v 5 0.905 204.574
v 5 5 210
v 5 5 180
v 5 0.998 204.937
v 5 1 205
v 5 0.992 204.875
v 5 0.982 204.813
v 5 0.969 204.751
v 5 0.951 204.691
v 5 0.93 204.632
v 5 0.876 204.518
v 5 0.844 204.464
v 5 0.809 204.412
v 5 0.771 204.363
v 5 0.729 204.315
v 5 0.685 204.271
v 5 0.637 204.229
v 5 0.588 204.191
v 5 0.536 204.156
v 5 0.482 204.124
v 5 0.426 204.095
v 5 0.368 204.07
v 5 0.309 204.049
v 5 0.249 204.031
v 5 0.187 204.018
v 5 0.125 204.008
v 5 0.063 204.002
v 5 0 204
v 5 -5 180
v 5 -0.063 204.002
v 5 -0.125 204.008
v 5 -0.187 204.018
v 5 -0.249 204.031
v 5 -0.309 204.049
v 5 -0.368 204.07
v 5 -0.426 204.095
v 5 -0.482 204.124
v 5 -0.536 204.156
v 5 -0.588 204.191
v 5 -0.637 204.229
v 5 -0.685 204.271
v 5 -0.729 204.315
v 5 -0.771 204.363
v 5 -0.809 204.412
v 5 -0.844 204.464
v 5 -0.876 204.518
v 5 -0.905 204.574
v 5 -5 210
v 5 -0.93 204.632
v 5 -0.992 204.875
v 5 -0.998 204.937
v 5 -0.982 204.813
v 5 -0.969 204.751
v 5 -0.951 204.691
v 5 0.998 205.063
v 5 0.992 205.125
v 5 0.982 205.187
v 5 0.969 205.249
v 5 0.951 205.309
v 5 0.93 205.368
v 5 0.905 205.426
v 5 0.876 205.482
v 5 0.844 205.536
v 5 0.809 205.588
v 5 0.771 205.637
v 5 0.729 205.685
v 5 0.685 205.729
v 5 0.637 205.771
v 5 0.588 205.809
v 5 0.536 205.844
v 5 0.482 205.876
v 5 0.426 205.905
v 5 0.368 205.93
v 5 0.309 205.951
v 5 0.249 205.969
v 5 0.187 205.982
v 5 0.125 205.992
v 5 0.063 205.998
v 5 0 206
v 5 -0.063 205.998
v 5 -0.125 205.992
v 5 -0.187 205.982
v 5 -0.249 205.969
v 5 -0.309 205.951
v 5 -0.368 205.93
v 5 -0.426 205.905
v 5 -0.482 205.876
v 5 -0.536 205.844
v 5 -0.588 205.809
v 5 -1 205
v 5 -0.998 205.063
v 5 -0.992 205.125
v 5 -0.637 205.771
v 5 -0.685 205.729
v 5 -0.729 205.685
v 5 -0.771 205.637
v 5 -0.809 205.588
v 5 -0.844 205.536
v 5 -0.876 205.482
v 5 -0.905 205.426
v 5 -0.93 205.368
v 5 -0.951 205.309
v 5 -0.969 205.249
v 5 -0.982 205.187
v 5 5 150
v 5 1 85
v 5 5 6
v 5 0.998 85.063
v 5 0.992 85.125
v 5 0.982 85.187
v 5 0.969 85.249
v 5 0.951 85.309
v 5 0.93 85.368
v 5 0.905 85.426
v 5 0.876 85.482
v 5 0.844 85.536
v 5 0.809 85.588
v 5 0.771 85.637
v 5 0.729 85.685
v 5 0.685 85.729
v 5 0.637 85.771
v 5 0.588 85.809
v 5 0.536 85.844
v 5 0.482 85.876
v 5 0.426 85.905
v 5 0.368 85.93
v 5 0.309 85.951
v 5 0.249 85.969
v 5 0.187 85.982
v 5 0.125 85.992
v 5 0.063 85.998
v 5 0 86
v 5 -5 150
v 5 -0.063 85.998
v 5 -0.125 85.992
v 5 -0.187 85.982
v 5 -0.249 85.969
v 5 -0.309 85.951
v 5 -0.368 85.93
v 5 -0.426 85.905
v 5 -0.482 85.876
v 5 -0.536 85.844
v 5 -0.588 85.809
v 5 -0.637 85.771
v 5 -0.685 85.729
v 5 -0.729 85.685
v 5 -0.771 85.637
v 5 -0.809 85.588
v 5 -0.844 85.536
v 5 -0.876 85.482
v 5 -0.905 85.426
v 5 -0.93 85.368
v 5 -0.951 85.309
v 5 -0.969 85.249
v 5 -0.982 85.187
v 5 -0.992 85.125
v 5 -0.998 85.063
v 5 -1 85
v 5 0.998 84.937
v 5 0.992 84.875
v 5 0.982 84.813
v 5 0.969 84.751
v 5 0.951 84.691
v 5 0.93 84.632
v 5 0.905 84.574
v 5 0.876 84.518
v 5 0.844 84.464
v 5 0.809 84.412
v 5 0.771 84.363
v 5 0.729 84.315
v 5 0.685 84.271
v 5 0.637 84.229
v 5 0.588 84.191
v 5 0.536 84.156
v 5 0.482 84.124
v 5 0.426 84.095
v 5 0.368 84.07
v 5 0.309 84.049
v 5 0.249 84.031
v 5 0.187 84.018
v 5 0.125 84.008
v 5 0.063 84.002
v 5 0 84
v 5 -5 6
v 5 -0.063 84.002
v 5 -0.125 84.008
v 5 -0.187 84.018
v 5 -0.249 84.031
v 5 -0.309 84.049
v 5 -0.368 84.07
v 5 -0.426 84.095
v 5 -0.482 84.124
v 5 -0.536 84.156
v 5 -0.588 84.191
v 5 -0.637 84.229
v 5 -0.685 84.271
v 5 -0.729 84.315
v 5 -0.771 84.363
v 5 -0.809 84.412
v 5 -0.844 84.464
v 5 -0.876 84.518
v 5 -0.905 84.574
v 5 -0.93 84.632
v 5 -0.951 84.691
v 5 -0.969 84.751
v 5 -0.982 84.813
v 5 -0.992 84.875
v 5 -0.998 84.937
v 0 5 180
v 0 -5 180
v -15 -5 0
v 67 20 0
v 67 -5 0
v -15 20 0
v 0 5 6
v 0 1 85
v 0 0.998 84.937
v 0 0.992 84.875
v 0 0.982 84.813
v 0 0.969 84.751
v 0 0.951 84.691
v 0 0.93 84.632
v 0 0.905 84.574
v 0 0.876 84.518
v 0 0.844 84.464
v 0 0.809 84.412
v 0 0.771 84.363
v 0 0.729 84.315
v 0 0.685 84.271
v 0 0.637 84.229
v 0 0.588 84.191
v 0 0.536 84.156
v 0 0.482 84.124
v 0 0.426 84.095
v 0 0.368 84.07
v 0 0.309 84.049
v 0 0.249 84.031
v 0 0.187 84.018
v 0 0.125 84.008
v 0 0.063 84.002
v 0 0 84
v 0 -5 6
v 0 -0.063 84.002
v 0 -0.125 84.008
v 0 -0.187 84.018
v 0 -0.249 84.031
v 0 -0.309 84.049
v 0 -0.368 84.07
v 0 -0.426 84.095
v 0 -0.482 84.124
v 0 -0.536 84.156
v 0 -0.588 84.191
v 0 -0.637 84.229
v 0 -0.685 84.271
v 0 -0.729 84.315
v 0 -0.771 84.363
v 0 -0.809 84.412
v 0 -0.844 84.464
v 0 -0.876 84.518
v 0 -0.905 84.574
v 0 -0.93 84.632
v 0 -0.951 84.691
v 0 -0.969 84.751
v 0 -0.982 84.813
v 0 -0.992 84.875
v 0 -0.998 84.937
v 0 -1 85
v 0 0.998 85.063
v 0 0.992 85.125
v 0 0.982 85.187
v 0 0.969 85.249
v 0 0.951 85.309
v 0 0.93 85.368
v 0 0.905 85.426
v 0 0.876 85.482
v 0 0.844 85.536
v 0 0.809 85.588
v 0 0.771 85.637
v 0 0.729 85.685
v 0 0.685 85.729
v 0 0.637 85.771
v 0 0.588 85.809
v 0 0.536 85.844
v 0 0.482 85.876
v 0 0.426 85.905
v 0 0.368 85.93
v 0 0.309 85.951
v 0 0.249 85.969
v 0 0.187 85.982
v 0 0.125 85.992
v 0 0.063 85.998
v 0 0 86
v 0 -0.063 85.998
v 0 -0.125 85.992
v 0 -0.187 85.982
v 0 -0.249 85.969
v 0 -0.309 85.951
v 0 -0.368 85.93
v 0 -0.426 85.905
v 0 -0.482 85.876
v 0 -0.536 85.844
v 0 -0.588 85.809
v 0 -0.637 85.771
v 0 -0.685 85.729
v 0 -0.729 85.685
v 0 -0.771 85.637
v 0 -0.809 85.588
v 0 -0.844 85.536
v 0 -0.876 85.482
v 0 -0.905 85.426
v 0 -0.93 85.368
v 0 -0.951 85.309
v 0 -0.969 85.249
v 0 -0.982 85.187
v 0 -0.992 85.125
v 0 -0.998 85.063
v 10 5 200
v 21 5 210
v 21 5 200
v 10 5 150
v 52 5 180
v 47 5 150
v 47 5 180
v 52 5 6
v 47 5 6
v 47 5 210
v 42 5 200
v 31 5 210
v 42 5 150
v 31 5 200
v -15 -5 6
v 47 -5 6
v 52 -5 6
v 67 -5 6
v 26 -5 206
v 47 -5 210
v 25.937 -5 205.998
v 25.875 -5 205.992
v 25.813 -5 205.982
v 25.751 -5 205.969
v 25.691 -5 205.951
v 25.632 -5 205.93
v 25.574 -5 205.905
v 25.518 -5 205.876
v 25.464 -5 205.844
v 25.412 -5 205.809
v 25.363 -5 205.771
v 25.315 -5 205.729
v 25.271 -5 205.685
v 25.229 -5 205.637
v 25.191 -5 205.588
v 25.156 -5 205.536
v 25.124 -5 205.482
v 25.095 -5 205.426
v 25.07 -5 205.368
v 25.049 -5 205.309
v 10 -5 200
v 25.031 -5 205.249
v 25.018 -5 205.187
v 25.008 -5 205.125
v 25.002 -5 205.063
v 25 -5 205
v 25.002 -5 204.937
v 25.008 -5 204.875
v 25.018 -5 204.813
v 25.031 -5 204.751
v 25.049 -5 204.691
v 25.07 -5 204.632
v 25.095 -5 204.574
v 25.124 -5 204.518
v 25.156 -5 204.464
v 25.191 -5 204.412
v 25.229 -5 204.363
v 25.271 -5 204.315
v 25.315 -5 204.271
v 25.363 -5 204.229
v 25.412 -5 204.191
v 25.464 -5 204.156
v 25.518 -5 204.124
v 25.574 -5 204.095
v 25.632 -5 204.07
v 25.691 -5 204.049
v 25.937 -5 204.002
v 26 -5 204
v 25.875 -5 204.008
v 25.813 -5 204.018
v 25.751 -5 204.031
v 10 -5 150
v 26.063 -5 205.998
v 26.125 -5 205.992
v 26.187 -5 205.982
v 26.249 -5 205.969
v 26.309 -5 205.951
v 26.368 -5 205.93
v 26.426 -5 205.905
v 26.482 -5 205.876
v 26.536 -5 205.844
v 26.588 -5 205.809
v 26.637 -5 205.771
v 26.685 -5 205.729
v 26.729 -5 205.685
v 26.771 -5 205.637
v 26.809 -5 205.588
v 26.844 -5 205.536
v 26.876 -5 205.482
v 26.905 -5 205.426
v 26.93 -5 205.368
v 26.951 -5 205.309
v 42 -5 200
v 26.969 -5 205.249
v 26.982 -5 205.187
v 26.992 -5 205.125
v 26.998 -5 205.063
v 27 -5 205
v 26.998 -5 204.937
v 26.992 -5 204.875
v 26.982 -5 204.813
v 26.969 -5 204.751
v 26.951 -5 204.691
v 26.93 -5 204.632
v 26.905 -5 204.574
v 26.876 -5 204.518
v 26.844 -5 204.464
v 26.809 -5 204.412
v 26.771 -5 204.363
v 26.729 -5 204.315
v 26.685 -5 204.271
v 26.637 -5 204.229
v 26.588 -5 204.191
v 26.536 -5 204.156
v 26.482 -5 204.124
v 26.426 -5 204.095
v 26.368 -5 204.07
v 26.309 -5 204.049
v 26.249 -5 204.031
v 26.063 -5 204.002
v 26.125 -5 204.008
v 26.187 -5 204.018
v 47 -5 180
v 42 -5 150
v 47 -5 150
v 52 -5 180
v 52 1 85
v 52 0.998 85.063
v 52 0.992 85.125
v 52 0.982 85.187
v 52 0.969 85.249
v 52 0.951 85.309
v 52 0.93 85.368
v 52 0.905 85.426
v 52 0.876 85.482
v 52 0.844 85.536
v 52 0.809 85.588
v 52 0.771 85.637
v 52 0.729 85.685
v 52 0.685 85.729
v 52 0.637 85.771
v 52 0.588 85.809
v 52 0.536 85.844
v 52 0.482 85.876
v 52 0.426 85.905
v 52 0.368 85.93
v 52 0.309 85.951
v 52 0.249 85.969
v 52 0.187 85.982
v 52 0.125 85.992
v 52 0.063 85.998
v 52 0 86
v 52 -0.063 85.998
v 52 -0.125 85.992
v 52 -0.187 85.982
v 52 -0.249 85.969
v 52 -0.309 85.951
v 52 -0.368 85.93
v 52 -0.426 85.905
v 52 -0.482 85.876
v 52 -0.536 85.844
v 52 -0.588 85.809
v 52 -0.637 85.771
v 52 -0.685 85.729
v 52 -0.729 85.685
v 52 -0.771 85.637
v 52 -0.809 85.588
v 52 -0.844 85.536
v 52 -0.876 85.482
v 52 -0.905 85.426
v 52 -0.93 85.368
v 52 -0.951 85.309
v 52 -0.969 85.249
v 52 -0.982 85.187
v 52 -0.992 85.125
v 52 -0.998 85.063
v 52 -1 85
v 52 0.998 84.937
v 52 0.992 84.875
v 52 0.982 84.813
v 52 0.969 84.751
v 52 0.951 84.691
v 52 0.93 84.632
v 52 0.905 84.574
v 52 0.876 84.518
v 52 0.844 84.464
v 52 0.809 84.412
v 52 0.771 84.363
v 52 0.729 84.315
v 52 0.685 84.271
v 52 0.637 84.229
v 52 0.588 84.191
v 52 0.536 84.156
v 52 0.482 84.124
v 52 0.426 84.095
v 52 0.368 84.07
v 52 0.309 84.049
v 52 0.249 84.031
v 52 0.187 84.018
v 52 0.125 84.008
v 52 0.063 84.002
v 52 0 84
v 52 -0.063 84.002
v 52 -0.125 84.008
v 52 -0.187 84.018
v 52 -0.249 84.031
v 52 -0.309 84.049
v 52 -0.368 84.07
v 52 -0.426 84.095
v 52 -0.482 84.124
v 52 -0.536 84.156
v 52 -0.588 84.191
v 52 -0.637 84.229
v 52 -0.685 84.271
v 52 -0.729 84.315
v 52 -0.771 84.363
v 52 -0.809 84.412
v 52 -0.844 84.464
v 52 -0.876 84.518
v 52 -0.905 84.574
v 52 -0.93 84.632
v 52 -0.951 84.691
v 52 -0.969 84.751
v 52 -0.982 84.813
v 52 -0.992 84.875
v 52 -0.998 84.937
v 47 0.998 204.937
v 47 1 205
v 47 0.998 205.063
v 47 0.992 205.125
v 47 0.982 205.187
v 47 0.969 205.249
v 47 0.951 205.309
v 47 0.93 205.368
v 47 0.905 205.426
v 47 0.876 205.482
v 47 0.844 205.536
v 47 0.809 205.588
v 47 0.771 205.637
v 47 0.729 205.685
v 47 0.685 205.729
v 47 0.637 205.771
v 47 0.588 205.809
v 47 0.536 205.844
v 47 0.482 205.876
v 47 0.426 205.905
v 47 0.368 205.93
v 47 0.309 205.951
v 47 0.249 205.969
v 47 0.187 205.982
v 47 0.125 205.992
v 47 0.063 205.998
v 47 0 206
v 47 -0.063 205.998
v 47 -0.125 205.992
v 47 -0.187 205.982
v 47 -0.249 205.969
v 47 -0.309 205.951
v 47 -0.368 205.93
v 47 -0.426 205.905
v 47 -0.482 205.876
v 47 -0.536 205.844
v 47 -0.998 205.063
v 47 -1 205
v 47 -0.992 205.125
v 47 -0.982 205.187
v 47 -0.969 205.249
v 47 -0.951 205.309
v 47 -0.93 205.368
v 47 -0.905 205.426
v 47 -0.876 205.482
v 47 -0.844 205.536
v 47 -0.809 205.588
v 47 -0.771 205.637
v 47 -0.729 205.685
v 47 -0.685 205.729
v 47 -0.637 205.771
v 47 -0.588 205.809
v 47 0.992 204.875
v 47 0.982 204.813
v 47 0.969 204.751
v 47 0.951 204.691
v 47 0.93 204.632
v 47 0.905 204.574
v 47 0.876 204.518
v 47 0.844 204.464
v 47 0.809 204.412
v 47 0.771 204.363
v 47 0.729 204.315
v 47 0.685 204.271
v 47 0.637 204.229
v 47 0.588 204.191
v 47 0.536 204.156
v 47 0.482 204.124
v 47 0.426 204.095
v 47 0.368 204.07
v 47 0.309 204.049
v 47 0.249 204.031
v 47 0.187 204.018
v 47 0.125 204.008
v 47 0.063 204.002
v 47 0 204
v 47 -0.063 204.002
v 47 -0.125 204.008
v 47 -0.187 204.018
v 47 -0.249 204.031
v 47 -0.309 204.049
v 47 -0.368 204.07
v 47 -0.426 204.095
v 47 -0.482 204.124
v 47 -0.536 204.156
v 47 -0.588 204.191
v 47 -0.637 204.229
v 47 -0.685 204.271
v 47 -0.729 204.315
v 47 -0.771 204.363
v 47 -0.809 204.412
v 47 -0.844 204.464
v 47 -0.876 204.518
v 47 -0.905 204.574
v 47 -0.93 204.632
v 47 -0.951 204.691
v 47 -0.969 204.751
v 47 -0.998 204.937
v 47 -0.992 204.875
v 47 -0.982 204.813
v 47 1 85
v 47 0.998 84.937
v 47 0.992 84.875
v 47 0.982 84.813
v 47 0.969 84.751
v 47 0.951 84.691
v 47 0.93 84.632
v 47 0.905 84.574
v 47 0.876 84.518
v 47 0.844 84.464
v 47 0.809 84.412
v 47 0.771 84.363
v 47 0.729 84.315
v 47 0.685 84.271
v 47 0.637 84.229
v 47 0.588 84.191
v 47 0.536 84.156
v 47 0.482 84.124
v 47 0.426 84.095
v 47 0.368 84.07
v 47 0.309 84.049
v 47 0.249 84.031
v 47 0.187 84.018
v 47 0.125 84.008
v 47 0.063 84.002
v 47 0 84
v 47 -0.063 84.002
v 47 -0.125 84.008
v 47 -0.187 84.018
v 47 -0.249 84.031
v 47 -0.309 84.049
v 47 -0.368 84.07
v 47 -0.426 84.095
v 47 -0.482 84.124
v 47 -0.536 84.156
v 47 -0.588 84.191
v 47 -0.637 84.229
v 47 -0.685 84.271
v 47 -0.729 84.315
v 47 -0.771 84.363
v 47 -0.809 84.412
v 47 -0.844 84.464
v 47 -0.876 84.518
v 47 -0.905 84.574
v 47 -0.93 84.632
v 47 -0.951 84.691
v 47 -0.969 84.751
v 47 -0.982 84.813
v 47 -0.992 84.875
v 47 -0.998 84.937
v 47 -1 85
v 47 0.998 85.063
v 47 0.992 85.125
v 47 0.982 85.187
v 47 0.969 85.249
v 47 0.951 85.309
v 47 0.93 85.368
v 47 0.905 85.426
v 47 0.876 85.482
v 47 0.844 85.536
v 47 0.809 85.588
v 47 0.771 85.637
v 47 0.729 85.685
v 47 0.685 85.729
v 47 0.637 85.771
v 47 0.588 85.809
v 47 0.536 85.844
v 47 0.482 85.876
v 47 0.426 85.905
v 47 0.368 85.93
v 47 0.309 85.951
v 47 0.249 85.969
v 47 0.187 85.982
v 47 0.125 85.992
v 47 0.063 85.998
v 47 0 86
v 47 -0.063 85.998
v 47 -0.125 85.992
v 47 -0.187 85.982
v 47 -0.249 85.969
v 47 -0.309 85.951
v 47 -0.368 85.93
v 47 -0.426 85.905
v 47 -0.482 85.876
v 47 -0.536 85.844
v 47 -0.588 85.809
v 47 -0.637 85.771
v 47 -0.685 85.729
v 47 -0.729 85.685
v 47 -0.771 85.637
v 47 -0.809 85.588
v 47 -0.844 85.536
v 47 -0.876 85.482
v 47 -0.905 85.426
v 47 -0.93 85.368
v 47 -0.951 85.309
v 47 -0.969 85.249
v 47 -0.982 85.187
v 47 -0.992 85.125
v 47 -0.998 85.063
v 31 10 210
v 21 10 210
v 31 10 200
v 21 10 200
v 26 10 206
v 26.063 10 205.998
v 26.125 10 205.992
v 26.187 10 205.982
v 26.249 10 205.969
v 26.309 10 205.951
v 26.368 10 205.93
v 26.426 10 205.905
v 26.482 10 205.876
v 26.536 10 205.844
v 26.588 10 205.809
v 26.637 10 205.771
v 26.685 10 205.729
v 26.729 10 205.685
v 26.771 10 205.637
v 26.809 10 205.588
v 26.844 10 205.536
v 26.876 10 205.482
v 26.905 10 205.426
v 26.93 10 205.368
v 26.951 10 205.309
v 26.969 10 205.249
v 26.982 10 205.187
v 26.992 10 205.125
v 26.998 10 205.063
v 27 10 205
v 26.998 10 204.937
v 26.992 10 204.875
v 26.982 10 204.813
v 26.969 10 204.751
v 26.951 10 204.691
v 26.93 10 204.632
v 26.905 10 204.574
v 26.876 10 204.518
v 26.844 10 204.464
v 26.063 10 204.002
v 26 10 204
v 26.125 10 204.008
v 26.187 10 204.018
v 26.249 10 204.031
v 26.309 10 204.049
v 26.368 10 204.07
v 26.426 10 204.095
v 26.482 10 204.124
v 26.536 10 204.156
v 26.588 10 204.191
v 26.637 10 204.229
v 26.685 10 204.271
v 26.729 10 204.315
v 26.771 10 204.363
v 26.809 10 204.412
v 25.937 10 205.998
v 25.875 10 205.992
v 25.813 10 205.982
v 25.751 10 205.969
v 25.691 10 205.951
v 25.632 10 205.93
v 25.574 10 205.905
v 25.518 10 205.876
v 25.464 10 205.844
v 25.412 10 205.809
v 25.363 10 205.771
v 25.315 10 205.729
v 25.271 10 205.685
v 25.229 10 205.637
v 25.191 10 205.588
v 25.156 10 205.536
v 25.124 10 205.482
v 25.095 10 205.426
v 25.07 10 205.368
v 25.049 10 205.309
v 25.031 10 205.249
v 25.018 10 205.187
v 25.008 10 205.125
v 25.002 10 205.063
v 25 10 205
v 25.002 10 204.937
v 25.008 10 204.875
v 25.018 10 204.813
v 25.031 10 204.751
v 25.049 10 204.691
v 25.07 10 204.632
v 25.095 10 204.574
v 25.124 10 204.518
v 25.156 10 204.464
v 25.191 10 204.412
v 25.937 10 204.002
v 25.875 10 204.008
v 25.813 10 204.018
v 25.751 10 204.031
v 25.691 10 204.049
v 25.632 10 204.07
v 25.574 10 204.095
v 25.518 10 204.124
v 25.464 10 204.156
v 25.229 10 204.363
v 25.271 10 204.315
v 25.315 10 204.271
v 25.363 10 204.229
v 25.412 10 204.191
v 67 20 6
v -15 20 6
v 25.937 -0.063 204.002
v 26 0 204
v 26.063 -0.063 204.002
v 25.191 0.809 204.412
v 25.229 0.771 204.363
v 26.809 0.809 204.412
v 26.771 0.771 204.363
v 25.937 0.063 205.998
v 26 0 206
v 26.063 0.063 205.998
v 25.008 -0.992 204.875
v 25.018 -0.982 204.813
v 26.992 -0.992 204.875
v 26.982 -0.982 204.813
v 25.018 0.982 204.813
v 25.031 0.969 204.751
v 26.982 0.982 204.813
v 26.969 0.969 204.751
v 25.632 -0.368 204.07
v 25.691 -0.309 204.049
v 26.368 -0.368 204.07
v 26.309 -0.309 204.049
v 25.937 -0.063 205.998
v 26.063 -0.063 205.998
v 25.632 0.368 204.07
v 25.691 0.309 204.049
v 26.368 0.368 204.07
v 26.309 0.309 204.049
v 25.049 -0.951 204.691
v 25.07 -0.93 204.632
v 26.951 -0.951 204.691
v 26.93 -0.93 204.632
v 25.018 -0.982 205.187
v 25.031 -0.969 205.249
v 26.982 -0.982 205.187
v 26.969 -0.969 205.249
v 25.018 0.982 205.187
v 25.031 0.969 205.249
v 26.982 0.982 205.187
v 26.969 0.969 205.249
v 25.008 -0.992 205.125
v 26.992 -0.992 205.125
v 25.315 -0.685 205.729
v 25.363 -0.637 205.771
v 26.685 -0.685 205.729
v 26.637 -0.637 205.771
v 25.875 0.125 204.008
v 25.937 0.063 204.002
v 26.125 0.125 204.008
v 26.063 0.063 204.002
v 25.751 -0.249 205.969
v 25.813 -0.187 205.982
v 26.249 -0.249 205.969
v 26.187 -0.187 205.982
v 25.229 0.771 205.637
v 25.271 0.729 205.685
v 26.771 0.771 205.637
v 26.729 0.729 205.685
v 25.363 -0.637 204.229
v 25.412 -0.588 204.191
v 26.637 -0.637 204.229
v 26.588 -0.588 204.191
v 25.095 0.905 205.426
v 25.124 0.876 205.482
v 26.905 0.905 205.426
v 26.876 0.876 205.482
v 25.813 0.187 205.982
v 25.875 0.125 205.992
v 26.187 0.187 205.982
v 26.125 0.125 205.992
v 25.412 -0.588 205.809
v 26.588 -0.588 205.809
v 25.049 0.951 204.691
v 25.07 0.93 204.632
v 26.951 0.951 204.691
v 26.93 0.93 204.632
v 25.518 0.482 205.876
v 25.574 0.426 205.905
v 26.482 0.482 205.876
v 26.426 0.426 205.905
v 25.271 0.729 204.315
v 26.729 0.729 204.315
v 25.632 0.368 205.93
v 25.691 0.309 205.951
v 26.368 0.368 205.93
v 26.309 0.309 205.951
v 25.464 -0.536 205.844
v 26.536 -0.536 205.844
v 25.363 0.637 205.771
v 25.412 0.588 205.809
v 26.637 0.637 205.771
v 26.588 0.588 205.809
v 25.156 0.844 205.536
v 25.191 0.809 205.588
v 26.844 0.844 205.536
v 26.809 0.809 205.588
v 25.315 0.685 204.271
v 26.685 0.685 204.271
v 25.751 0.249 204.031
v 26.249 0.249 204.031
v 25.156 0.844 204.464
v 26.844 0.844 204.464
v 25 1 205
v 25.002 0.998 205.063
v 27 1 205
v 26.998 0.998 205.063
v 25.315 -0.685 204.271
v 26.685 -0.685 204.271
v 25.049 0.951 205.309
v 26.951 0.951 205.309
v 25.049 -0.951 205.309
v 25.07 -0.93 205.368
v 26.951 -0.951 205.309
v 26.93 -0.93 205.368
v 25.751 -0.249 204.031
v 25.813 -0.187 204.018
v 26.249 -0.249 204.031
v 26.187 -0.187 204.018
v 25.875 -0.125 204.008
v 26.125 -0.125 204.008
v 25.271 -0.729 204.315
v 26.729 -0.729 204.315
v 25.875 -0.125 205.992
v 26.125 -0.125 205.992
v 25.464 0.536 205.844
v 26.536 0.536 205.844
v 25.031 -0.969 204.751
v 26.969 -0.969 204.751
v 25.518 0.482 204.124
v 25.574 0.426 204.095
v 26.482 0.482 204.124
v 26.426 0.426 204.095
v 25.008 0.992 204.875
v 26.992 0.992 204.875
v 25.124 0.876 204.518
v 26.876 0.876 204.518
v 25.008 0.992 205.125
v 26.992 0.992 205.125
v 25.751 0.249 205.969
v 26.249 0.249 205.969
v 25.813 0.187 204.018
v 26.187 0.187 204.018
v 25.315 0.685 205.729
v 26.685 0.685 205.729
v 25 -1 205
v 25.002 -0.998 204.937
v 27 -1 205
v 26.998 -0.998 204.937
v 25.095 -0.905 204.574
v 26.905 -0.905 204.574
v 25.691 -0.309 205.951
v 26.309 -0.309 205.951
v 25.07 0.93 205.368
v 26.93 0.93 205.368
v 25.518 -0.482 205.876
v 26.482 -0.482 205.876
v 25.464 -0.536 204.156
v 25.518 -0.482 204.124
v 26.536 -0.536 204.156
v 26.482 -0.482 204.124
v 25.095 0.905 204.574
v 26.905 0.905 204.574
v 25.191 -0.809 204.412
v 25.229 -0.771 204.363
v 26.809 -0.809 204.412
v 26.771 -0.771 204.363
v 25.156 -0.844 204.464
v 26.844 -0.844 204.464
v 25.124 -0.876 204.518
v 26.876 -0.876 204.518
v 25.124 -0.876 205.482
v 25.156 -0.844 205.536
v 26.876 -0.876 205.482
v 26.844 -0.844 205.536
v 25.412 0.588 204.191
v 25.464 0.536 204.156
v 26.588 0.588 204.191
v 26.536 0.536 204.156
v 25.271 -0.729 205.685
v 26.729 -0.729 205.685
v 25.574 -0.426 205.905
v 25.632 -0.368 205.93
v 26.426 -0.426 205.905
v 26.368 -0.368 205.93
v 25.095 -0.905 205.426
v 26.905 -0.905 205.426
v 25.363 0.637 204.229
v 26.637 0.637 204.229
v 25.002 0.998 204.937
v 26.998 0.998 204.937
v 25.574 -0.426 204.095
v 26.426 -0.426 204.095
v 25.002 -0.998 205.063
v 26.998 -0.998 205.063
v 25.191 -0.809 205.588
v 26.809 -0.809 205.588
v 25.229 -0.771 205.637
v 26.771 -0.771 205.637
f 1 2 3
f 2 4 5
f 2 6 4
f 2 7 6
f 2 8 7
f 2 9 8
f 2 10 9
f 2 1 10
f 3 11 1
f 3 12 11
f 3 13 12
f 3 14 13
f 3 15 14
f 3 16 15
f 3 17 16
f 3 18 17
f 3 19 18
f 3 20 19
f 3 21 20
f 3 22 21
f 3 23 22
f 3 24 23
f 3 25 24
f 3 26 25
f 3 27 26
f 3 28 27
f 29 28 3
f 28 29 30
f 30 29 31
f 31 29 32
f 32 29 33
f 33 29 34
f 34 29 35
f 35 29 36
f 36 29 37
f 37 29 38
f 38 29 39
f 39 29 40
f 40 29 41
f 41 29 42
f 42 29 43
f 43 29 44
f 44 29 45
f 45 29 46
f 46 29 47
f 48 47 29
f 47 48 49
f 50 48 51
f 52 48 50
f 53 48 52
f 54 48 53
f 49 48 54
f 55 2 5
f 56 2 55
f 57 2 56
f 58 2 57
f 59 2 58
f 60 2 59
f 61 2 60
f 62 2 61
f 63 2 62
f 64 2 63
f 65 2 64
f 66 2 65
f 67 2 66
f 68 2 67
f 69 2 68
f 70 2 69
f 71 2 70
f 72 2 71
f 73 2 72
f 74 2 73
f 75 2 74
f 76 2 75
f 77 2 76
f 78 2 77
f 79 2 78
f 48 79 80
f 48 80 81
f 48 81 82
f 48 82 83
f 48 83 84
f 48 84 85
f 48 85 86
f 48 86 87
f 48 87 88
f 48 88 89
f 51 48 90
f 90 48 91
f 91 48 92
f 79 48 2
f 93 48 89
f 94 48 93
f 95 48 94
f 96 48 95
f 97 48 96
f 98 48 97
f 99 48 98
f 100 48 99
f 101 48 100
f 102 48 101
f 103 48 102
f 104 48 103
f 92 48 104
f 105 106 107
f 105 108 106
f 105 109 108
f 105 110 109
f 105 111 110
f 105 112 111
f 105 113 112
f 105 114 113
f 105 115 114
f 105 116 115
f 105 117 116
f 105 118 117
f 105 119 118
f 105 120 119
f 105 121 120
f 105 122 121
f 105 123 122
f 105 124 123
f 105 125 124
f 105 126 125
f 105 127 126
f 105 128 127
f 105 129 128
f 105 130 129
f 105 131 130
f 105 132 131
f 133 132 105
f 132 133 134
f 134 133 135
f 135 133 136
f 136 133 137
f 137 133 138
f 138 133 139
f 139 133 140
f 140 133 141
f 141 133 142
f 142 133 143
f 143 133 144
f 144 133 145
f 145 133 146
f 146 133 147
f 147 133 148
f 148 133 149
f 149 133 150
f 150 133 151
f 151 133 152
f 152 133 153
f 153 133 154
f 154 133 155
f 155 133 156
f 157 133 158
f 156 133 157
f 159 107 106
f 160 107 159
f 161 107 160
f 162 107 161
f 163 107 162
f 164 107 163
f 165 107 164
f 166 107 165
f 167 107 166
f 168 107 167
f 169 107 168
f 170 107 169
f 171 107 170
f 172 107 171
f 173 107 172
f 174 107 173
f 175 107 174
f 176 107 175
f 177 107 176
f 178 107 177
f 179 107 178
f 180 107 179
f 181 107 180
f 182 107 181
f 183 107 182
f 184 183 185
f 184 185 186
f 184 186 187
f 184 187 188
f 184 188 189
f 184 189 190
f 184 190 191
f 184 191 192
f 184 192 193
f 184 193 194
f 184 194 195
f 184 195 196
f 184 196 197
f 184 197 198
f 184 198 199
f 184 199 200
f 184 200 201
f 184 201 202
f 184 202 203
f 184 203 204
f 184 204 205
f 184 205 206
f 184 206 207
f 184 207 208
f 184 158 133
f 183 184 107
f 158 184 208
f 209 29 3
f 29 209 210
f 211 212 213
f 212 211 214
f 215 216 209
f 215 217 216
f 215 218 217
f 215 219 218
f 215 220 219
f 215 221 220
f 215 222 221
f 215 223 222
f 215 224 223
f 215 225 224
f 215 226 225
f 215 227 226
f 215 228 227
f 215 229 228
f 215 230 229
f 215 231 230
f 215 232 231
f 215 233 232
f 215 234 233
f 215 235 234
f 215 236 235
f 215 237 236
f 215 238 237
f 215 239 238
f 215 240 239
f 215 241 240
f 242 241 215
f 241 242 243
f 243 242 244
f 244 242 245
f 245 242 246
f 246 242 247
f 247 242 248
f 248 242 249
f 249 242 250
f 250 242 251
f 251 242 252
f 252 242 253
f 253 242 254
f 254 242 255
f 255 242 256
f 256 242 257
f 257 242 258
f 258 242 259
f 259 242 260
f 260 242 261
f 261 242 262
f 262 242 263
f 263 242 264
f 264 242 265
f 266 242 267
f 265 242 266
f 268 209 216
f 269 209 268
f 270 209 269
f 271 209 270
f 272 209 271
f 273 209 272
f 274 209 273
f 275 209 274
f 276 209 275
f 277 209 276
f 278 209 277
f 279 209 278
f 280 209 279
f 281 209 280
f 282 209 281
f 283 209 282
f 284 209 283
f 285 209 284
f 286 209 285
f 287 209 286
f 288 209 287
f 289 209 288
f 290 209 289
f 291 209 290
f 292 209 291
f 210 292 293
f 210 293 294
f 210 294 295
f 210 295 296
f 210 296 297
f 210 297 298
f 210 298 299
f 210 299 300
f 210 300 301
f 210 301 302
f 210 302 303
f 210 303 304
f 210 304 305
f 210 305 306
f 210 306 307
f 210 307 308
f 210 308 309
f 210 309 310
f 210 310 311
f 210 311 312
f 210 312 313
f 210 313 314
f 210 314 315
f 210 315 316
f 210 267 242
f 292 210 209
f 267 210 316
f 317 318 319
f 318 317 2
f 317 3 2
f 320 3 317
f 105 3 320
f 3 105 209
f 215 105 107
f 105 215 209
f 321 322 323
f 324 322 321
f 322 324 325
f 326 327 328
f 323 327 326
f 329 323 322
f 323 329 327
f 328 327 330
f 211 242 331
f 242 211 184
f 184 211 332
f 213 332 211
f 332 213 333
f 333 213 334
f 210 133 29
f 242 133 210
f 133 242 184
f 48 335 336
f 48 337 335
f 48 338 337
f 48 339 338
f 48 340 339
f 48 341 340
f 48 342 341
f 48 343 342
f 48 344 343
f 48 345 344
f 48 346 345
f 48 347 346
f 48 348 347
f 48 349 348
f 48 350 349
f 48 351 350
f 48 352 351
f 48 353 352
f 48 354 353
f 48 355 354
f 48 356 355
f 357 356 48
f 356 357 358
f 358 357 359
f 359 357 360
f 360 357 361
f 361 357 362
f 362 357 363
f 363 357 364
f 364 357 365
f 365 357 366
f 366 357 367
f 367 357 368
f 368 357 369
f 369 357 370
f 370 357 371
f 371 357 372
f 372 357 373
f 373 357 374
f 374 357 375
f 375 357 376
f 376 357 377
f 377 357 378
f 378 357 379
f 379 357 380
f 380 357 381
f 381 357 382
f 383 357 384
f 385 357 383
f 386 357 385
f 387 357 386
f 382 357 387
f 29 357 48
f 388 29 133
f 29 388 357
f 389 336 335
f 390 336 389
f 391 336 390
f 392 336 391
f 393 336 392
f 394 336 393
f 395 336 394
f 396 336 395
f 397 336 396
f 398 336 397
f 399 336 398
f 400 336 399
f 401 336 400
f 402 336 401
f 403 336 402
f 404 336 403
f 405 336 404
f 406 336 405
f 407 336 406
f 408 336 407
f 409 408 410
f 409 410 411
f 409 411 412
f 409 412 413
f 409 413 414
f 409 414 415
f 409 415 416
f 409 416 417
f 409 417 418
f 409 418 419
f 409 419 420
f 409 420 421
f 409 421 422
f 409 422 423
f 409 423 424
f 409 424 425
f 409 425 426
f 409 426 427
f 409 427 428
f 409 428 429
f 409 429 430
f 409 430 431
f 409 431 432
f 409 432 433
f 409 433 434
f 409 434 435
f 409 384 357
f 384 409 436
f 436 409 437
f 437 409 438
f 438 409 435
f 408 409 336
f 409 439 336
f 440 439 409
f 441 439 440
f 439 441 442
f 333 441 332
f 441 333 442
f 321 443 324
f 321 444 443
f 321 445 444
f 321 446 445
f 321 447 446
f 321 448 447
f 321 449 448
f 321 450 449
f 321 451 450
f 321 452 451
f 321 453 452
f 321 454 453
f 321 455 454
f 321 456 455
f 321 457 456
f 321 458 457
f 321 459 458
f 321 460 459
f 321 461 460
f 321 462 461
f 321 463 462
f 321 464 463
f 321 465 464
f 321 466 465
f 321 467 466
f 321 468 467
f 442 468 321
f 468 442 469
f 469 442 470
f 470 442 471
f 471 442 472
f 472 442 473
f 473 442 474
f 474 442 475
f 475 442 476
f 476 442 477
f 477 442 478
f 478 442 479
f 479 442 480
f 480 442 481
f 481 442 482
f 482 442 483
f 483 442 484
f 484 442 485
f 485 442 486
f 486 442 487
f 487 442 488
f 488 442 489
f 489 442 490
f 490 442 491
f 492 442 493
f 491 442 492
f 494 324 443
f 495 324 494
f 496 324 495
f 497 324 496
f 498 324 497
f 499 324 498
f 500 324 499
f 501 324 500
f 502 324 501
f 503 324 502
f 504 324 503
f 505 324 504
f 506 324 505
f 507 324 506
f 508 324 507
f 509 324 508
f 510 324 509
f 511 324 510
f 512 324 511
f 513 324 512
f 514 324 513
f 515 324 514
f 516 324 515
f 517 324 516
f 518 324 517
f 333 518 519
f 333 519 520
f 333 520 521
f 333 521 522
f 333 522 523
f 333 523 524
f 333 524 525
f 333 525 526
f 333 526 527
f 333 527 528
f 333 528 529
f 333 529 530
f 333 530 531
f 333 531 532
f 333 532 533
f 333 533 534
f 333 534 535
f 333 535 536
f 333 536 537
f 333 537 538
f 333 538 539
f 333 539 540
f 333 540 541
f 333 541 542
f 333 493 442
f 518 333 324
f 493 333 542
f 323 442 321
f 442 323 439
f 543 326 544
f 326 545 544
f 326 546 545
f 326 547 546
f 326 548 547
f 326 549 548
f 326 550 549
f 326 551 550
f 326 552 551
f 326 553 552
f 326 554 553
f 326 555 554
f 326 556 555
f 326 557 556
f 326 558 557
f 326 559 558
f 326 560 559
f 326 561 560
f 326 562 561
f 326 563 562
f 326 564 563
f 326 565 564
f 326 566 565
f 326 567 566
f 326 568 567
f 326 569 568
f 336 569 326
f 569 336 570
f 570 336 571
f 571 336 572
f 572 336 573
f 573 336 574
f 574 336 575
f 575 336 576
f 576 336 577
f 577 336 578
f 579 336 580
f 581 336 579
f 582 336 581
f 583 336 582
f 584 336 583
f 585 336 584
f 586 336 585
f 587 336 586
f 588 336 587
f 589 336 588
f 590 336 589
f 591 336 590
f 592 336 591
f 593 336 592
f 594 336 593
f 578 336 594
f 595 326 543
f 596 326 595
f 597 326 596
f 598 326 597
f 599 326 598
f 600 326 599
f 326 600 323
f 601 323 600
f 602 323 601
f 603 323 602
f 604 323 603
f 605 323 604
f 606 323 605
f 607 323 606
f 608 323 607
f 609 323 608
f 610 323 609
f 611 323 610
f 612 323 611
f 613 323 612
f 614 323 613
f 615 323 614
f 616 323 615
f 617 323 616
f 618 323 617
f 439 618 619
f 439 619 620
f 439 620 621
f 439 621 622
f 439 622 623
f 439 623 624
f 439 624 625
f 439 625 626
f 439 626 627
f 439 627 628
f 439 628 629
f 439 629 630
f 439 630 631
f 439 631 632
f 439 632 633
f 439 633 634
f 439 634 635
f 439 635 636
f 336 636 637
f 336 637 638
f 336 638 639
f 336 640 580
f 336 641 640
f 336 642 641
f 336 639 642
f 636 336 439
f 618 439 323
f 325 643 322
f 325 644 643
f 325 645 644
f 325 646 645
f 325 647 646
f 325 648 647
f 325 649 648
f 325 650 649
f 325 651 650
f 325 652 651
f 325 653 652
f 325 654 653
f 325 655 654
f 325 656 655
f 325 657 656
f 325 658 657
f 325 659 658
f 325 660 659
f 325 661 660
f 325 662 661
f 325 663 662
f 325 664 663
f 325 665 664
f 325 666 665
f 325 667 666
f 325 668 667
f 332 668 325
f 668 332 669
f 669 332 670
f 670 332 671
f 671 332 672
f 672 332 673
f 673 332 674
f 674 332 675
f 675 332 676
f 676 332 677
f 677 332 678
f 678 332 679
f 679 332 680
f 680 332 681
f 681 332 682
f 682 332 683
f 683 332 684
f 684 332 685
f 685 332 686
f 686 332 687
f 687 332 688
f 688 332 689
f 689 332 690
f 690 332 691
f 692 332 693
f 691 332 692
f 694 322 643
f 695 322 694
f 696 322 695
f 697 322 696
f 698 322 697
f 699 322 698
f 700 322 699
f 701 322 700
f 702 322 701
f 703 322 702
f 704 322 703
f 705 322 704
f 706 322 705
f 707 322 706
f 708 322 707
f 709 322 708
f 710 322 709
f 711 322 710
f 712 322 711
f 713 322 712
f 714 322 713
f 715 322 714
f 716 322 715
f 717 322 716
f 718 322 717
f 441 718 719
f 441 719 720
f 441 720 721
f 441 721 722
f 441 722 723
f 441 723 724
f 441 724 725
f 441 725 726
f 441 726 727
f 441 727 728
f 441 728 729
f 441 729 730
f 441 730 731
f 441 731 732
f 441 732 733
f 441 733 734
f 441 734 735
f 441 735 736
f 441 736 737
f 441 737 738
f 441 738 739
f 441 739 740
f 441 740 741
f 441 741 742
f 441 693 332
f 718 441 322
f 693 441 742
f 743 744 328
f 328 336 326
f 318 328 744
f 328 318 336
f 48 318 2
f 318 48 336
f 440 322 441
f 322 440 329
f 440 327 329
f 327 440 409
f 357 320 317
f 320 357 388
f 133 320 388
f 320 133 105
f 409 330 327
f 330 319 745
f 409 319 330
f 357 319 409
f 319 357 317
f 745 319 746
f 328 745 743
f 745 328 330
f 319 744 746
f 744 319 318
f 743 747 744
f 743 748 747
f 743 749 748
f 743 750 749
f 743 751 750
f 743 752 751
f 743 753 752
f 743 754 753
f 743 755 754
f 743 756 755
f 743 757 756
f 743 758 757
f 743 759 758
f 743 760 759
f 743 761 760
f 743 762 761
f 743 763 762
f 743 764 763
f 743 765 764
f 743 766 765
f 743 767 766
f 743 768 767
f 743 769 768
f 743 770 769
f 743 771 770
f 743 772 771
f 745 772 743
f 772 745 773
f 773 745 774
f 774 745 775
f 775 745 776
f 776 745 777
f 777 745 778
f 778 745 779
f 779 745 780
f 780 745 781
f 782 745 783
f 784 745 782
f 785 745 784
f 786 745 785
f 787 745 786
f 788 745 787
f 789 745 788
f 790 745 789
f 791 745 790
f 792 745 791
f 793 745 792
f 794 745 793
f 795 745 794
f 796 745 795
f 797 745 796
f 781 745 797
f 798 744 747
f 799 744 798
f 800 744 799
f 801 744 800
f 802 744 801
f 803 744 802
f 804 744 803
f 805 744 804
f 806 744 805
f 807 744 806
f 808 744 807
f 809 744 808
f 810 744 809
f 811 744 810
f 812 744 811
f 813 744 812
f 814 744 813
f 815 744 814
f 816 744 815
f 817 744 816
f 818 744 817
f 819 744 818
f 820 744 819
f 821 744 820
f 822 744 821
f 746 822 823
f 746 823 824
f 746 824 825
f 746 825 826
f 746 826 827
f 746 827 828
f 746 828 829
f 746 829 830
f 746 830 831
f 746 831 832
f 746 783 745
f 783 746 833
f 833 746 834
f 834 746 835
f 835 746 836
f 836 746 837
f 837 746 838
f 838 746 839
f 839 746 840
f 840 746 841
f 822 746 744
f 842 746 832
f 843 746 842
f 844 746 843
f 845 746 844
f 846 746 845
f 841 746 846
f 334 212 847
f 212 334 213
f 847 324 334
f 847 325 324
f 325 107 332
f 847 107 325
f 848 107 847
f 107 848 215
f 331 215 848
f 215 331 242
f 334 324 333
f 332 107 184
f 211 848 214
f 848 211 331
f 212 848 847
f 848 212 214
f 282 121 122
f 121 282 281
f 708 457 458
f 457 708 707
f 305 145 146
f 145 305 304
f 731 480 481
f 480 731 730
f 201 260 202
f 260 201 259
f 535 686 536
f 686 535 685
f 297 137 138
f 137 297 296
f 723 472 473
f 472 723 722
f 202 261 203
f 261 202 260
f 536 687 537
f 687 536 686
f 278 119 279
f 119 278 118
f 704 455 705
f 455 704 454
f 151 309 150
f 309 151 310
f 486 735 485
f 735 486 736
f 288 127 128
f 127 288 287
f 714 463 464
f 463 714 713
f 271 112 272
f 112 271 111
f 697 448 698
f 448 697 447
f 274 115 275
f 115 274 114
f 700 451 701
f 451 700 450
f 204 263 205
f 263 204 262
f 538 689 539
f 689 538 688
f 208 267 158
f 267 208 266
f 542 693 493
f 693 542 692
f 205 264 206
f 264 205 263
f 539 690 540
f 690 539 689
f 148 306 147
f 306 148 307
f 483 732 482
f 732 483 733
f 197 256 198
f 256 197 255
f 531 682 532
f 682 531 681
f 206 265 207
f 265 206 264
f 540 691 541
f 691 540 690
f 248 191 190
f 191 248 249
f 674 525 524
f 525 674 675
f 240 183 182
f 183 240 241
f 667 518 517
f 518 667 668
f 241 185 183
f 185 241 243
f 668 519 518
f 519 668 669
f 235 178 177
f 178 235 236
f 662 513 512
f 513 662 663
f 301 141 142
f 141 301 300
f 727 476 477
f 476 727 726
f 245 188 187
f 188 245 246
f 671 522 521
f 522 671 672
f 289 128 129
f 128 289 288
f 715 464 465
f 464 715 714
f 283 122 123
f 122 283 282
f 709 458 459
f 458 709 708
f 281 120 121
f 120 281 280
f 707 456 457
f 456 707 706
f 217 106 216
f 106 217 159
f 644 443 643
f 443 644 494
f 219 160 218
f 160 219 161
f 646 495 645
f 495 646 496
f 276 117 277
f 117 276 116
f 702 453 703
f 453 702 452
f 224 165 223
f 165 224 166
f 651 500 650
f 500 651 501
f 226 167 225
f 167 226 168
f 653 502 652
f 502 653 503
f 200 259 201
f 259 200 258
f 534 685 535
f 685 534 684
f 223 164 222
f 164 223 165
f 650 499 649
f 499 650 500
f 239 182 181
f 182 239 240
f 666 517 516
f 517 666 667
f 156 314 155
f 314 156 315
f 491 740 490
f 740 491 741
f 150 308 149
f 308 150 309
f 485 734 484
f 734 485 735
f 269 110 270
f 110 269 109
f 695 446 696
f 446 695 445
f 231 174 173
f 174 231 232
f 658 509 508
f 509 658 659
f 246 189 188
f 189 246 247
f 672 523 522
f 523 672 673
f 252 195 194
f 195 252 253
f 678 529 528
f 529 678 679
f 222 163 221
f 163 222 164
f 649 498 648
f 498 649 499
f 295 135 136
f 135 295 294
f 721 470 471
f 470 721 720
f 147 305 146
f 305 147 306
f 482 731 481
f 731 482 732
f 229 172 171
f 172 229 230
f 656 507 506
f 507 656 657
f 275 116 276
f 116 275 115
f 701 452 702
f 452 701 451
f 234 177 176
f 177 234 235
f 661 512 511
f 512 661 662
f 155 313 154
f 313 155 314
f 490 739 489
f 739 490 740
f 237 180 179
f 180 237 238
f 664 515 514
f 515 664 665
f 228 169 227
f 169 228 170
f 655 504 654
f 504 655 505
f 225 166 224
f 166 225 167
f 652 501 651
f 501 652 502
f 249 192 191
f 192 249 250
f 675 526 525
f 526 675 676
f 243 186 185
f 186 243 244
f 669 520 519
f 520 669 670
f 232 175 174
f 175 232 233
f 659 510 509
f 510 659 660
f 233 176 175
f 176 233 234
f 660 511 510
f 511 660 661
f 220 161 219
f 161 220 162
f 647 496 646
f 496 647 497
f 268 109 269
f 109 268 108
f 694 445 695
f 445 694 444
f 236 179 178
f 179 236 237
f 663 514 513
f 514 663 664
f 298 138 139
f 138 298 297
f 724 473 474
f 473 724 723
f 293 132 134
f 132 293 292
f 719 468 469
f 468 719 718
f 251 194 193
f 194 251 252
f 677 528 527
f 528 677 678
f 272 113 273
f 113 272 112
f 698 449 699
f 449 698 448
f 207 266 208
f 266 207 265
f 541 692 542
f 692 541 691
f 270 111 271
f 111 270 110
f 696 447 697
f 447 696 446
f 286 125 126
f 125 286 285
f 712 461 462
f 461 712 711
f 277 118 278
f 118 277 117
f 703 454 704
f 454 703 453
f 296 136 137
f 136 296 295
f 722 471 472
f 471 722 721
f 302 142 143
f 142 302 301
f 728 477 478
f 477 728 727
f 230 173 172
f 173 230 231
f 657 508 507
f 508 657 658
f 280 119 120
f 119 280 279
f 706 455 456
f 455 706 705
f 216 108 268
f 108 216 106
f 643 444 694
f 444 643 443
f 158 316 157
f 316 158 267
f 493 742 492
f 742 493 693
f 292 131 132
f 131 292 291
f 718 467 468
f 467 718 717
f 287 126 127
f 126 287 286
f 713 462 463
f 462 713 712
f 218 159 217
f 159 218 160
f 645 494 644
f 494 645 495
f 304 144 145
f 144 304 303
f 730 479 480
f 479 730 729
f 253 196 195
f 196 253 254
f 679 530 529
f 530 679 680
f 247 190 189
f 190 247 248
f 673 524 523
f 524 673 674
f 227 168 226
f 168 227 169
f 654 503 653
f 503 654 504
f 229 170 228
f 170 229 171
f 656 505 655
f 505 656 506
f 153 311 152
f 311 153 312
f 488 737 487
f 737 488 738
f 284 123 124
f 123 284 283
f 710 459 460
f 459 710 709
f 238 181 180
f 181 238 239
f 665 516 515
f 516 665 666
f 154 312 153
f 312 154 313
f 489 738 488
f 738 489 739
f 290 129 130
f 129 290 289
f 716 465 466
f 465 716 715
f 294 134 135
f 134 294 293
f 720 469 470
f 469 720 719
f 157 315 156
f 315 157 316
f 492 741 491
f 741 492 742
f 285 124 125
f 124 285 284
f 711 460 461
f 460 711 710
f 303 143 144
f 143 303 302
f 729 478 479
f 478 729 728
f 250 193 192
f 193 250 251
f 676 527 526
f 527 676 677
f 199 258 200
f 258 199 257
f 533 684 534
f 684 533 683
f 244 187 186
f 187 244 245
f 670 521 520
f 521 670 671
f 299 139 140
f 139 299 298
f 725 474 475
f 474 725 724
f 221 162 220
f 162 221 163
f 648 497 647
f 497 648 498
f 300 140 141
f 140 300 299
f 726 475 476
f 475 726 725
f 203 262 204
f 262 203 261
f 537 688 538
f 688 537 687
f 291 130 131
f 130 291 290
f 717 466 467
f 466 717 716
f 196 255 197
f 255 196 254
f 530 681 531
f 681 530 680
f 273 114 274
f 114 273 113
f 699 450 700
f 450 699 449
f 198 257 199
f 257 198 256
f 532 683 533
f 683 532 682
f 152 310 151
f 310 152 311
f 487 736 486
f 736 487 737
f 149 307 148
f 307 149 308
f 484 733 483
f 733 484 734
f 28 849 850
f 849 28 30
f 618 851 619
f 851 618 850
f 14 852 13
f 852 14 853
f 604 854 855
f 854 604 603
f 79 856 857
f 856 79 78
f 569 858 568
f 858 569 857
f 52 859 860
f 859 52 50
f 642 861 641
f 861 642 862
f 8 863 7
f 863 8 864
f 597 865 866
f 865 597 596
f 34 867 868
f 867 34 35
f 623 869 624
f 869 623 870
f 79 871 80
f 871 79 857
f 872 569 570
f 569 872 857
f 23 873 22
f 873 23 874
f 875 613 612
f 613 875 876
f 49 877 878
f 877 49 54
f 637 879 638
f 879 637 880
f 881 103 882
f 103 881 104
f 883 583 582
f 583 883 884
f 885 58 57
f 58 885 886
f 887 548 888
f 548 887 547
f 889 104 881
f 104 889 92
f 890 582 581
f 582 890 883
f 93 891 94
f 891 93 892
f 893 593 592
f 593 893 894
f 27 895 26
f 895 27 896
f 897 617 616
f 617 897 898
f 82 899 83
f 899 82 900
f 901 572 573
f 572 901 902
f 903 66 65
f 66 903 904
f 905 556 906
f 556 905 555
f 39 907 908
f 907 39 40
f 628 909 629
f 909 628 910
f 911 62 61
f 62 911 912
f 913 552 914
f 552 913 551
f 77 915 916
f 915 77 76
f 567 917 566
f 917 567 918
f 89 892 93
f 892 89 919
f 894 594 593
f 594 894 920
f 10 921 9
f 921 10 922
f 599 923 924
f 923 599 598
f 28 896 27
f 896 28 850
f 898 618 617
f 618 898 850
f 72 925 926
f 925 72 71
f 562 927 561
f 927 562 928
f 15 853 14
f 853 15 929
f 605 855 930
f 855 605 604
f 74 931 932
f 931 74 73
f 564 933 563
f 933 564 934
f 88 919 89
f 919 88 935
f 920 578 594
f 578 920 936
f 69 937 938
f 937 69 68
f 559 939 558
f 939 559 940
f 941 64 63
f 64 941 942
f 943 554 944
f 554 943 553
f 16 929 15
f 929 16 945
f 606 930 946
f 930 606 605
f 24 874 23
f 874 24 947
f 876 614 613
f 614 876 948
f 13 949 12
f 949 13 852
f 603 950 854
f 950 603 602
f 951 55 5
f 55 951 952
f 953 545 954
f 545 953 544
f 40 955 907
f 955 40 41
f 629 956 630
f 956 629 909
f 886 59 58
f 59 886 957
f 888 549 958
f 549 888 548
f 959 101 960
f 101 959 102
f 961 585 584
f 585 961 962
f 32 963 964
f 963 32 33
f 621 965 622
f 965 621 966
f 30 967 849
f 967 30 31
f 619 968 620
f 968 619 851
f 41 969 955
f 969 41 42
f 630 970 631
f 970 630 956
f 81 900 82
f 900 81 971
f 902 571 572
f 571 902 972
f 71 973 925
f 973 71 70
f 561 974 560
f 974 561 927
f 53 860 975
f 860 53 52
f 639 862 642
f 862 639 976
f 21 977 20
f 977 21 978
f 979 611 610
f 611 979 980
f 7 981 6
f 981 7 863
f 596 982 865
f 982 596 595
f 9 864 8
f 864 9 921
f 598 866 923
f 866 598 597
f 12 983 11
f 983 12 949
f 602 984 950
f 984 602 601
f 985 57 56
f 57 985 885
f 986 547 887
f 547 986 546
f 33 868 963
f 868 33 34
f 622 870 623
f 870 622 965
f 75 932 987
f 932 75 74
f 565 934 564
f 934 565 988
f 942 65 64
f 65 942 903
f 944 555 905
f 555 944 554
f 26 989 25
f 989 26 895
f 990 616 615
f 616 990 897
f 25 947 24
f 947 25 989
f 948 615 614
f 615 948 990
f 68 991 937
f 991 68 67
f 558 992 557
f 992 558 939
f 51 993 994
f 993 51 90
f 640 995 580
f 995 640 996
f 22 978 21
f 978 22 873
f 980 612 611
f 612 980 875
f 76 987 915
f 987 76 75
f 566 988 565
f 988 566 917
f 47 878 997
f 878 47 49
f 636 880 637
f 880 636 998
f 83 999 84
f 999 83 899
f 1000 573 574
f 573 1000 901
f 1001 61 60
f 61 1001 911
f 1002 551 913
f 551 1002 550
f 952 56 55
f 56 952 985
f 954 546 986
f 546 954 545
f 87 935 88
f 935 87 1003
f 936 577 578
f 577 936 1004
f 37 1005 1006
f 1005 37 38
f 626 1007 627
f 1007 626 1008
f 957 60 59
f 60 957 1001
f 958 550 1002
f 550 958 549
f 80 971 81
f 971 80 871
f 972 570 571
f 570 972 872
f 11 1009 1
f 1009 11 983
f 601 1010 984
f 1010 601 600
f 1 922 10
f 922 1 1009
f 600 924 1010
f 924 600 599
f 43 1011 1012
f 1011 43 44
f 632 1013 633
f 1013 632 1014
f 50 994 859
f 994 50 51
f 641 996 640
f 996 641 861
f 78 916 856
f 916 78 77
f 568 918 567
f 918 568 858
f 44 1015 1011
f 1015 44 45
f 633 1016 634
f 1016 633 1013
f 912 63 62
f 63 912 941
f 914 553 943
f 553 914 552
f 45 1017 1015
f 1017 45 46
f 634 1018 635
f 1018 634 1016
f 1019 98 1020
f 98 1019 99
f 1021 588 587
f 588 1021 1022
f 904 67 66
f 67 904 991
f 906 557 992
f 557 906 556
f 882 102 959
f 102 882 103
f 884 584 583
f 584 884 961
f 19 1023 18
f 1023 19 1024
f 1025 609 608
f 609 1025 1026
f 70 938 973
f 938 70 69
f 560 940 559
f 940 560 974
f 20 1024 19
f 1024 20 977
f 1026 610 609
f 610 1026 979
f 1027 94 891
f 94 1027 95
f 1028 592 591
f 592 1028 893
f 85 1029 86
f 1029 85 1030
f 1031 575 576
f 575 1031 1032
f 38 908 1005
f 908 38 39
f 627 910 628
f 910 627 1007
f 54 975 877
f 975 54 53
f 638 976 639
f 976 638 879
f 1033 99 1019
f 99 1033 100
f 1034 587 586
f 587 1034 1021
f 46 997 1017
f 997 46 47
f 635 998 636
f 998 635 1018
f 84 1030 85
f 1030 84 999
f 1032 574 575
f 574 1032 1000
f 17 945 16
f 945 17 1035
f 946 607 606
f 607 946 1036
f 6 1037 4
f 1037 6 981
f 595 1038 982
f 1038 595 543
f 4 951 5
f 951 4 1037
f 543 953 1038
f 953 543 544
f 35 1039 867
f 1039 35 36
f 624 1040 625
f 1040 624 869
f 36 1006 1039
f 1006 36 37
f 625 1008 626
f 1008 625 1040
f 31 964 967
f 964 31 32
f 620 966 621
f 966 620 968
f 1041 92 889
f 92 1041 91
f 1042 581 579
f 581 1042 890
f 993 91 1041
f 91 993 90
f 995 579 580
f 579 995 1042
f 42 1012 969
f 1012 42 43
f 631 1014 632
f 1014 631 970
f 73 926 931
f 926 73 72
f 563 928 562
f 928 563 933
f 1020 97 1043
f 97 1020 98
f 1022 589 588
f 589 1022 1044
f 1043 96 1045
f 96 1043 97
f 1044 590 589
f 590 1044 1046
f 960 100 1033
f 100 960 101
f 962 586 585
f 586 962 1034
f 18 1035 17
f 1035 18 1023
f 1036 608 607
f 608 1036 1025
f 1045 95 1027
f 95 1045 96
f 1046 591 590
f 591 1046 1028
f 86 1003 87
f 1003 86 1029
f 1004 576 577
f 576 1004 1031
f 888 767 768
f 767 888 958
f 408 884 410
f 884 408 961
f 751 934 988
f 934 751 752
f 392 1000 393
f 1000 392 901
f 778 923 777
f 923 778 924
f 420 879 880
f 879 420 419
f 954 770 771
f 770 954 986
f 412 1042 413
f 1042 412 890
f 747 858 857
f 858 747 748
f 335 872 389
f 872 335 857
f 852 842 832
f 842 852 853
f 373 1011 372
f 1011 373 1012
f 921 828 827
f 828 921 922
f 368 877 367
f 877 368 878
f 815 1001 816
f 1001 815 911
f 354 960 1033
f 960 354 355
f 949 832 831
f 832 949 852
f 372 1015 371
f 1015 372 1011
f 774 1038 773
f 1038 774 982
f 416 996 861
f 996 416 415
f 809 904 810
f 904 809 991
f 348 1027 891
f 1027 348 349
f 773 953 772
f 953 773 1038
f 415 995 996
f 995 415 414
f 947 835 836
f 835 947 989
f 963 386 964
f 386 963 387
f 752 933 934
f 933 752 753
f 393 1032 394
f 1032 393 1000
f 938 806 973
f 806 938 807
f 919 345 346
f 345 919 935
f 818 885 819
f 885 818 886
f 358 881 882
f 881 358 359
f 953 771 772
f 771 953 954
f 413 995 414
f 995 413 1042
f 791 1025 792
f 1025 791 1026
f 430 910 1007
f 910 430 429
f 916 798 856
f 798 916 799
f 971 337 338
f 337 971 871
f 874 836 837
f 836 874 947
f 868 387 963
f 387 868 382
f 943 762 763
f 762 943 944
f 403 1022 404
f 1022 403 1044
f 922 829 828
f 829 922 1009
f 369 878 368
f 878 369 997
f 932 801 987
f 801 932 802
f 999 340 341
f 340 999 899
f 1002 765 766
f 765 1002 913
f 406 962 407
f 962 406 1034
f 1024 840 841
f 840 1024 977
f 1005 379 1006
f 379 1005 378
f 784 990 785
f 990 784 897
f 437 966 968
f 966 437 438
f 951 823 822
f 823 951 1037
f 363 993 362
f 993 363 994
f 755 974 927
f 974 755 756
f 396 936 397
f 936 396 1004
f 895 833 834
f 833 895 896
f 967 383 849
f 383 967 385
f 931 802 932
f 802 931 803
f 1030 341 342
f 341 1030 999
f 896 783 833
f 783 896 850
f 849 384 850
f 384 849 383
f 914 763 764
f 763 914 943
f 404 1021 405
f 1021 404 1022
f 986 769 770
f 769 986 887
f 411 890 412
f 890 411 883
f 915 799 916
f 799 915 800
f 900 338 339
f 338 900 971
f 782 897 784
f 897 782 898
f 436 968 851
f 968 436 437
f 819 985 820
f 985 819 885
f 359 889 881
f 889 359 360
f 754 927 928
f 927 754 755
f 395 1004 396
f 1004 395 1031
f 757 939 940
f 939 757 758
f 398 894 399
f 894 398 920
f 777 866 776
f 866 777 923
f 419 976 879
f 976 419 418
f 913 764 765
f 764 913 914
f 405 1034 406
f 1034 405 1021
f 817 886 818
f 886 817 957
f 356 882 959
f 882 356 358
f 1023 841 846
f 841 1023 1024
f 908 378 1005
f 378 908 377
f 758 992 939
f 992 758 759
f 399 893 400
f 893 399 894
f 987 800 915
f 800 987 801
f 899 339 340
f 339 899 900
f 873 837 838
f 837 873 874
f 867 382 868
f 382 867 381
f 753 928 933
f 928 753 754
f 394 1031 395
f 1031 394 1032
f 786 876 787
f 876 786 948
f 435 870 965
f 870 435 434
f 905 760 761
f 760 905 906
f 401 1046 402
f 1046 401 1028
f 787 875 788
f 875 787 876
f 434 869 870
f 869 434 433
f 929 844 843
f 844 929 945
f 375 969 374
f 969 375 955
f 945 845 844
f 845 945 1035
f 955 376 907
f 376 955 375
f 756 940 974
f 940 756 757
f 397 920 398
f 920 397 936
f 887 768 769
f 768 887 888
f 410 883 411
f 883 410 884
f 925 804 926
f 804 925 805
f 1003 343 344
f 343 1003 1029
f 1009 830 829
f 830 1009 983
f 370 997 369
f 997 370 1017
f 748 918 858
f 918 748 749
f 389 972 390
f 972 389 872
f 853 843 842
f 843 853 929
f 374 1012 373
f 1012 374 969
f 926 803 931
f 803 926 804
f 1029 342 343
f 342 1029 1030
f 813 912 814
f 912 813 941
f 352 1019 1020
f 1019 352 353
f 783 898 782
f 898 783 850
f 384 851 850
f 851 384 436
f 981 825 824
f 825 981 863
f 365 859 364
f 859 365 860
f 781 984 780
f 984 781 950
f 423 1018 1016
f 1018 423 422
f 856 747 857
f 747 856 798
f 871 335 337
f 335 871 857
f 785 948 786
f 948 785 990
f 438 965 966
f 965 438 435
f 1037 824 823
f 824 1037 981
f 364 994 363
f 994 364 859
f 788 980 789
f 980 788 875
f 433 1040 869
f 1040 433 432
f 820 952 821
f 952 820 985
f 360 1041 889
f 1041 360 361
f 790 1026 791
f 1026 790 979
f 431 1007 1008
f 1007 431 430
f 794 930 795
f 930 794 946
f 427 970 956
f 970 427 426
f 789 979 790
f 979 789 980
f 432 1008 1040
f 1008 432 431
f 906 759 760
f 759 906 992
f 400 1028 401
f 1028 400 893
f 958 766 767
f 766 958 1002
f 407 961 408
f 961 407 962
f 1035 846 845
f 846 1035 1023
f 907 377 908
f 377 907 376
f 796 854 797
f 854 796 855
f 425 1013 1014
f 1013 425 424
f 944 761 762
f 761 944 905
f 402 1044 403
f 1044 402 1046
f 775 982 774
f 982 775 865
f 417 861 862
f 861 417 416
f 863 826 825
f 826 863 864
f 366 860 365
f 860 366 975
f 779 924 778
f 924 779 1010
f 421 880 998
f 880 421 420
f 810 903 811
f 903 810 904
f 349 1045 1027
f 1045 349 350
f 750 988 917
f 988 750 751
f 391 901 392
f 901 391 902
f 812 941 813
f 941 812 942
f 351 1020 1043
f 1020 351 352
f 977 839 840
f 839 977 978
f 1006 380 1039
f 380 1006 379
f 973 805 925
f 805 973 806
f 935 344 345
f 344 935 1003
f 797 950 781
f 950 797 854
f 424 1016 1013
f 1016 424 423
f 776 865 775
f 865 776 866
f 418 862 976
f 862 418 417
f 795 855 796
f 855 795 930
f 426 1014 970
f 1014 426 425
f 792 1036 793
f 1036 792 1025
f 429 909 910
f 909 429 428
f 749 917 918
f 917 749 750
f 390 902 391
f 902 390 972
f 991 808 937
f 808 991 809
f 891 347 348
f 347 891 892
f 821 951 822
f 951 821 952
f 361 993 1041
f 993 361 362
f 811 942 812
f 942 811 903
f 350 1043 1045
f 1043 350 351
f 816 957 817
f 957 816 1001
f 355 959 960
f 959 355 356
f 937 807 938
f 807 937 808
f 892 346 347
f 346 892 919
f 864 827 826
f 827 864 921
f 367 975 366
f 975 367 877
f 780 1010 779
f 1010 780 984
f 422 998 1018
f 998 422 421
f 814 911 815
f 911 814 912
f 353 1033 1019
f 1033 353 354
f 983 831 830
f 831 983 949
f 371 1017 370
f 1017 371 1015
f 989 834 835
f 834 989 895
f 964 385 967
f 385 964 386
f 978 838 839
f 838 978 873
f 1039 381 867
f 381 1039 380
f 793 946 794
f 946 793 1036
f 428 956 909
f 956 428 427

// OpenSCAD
difference(){
	union(){
        translate([0,-5,0]){
           cube([5,10,180], center=false);
       }
       translate([0+5+42,-5,0]){
           cube([5,10,180], center=false);
       }


       translate([42,-5,150]){
           cube([5,10,60], center=false);
       }
       translate([5,-5,150]){
           cube([5,10,60], center=false);
       }
       translate([5,-5,200]){
           cube([42,10,10], center=false);
       }
       translate([42/2,-5,200]){
           cube([10,15,10], center=false);
       }
       translate([-15,-5,00]){
           cube([82,25,6], center=false);
       }

	}
	union() {       
			   
       translate([-30,0,85]){
            rotate(a = [0,90,0]) {
                cylinder(h=600, r=1, $fn=100, center=false);
            }
       }			   
		   
       translate([-30,0,205]){
            rotate(a = [0,90,0]) {
                cylinder(h=600, r=1, $fn=100, center=false);
            }
       }			   


			
       translate([5+42/2,10,205]){
            rotate(a = [90,0,0]) {
                cylinder(h=600, r=1, $fn=100, center=false);
            }
       }			   
   


        
	}
}
